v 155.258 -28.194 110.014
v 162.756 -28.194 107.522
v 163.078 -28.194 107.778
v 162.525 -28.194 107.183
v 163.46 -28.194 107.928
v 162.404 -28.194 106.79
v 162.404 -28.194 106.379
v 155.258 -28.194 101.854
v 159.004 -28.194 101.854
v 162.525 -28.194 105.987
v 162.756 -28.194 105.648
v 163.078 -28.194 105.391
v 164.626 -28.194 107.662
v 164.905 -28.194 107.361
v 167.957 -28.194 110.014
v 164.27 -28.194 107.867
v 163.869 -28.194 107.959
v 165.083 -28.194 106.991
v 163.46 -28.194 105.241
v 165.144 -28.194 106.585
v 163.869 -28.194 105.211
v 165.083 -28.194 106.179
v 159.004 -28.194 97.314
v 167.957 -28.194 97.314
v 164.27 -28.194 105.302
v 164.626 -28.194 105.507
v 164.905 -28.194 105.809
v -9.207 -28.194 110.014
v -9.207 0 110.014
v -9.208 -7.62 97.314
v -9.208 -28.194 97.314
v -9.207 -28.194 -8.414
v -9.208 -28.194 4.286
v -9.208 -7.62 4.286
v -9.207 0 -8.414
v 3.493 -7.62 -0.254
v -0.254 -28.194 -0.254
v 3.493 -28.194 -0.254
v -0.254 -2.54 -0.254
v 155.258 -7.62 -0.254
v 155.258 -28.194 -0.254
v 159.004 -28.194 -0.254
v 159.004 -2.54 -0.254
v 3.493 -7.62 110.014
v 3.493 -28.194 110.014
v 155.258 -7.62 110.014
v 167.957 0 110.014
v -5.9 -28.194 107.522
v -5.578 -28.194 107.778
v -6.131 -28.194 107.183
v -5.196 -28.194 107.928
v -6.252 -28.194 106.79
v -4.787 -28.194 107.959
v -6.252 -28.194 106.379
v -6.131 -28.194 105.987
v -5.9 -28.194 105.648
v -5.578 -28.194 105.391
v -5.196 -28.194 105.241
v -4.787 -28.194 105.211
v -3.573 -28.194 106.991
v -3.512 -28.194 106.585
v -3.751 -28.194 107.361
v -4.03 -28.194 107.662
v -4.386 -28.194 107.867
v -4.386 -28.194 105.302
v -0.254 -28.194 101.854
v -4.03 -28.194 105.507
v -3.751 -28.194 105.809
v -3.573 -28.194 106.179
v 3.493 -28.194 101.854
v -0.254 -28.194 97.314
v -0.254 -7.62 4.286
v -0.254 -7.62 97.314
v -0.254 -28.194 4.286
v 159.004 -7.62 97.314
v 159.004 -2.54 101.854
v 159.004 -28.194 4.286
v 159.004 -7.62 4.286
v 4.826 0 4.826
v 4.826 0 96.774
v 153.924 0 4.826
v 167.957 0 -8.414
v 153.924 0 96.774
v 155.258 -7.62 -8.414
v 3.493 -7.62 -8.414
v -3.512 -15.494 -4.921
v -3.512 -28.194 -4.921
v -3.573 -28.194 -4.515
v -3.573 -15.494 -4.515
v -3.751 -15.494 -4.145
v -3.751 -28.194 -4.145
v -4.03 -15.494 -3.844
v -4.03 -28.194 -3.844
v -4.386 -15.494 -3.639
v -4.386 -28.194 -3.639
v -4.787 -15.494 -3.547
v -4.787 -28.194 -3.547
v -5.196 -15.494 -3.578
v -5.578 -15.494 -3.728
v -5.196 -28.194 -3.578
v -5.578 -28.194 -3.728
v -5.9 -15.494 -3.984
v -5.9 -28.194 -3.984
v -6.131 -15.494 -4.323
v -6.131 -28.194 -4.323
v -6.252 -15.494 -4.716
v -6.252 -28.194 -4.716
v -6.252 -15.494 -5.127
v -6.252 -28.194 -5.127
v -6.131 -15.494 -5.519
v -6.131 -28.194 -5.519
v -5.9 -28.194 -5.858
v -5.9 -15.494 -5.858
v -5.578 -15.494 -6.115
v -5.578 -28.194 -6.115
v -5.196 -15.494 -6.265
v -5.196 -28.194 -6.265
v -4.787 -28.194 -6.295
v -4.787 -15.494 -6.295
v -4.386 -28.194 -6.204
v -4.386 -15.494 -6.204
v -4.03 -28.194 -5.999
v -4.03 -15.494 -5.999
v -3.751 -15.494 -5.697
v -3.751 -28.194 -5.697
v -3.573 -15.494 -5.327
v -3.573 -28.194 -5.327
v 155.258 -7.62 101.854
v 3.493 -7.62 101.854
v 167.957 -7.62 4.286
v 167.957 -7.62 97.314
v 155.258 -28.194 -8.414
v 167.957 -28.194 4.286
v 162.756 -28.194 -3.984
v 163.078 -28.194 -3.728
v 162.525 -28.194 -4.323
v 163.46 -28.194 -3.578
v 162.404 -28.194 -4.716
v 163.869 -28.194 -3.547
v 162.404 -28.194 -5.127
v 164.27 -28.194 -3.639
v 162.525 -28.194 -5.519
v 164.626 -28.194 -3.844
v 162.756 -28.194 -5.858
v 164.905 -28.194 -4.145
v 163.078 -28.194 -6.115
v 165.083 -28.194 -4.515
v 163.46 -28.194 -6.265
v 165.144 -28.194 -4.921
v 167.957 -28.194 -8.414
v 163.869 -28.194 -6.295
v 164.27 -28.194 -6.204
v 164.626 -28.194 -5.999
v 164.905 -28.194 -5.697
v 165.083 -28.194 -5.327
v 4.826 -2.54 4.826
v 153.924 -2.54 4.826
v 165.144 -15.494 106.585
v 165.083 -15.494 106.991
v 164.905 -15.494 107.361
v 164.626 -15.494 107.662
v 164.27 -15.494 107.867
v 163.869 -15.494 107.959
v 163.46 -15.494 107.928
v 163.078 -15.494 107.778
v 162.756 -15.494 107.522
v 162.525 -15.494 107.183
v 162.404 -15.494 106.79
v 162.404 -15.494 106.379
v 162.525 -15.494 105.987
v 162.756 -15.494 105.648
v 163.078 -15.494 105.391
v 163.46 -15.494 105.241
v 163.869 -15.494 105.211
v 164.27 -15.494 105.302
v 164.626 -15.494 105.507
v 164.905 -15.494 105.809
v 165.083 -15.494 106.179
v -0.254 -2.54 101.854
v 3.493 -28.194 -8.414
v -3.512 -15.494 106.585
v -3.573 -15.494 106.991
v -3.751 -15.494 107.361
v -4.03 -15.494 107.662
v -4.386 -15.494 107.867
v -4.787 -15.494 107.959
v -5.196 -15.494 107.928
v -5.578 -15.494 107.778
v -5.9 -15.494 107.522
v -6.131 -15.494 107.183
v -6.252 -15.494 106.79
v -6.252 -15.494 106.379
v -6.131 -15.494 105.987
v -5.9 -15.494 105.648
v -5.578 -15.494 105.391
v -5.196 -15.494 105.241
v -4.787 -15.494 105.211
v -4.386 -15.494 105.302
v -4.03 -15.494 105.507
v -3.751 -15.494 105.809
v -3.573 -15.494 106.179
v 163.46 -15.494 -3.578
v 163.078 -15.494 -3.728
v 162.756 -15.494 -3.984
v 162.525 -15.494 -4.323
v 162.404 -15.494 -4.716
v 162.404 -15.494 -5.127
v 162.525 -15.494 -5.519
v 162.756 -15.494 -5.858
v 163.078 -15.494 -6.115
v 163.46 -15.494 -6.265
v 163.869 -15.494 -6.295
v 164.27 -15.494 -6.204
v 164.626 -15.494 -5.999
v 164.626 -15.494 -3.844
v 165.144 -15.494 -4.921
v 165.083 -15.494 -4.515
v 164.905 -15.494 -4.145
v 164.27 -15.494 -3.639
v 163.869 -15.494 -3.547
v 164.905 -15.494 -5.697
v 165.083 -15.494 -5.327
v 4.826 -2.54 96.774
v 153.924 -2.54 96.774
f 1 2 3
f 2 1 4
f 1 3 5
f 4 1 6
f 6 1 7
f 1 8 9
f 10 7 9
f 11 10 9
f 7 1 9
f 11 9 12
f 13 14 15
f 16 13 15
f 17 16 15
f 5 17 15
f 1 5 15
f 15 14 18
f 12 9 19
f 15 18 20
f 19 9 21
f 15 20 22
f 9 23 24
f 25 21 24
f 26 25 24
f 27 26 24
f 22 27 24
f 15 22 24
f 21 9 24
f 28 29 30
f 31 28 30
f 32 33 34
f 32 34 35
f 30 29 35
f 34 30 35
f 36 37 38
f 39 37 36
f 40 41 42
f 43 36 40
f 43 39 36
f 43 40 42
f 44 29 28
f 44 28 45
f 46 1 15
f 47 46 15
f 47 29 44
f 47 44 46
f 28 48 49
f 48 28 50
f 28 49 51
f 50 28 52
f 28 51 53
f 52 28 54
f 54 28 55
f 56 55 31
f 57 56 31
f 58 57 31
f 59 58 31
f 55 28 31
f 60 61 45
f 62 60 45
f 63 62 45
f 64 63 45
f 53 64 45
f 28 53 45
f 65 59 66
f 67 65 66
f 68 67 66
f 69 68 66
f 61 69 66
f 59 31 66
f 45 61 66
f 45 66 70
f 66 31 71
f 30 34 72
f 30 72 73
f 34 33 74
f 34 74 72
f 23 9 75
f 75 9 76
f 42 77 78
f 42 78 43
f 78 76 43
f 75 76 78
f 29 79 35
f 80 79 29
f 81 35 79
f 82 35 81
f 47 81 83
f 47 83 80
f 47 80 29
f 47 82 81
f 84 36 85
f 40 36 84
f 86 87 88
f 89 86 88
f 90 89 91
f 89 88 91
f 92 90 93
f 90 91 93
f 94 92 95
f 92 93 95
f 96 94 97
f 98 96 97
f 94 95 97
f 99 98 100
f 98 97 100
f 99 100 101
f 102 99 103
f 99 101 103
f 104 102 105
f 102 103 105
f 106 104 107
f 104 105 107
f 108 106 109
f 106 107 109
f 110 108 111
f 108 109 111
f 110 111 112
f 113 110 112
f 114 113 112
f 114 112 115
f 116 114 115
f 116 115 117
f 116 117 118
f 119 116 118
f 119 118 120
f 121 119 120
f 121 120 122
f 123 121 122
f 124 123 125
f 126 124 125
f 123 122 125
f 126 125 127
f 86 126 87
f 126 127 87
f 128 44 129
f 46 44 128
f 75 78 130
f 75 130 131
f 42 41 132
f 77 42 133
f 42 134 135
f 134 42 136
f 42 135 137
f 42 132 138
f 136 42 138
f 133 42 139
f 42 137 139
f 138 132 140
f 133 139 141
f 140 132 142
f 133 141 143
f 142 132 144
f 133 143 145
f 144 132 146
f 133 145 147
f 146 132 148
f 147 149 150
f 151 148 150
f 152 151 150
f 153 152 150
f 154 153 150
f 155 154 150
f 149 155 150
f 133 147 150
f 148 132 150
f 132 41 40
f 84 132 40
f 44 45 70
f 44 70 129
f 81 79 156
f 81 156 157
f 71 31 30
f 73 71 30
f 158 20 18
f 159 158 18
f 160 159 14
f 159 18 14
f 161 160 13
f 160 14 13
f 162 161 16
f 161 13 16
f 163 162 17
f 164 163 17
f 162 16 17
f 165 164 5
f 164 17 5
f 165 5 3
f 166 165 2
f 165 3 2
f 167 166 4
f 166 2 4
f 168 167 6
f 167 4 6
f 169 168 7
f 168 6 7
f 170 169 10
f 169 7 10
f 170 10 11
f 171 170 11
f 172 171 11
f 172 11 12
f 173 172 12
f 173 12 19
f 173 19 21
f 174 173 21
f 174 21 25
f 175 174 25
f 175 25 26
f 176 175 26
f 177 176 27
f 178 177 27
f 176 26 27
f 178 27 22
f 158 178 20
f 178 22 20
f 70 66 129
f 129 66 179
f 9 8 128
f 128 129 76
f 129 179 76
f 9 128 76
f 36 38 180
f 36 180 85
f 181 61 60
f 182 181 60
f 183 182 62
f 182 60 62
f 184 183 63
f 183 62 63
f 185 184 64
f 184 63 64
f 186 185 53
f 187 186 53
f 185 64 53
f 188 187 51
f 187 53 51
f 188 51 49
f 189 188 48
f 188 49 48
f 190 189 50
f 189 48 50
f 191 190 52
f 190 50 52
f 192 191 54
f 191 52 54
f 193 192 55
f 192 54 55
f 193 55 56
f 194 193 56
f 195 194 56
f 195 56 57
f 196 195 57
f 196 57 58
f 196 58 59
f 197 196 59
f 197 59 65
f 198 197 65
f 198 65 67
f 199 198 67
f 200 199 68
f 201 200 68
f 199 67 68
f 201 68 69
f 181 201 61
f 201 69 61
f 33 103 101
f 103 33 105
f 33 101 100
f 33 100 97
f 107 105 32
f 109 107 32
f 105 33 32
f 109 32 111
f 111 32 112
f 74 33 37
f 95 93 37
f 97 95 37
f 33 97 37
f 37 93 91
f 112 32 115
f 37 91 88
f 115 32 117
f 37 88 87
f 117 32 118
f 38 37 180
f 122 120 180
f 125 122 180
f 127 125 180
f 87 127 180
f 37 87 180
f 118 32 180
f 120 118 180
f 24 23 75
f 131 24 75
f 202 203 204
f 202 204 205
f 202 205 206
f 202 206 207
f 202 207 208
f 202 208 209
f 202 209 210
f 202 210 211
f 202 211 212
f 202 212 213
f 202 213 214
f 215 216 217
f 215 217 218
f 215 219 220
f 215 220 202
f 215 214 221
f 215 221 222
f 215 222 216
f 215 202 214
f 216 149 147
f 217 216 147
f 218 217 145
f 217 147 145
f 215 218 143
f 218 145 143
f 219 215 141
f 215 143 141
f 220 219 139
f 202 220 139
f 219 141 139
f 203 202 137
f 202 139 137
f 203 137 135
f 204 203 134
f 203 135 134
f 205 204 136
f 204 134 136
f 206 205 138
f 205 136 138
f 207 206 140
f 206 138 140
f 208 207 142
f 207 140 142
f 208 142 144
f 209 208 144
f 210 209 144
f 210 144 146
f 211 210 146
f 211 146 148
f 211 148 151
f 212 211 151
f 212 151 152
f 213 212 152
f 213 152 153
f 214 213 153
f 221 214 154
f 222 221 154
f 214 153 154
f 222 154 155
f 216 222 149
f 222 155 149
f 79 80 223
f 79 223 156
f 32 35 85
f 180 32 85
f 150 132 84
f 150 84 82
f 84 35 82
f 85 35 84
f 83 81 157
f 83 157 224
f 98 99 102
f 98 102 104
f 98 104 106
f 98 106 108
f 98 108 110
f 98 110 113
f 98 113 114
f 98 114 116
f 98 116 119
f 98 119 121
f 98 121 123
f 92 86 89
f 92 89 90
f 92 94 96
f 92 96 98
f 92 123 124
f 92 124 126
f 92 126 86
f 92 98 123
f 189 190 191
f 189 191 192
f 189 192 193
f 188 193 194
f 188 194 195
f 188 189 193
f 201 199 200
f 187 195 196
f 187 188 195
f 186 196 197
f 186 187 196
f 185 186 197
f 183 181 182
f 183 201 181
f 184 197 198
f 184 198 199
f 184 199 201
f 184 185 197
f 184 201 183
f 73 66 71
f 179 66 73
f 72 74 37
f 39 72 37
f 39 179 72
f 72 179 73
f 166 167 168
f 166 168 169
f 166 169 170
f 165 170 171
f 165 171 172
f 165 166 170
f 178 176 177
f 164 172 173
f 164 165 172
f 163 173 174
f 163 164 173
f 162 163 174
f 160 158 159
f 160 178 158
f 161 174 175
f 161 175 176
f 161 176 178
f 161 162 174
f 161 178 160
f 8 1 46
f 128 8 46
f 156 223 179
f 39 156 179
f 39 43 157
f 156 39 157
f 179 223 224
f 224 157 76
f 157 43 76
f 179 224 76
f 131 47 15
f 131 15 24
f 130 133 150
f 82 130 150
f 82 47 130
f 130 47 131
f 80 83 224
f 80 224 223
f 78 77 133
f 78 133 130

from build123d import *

# Parameters (mm, degrees)
SKETCH1_W           = 177.165
SKETCH1_H           = 118.4275
SKETCH1_W_2         = 159.258
SKETCH1_H_2         = 102.108
BOSS_EXTRUDE1_DEPTH = 28.194
SKETCH2_W           = 159.258
SKETCH2_H           = 2.54
BOSS_EXTRUDE2_DEPTH = 5.08
SKETCH3_W           = 97.028
SKETCH3_H           = 2.54
BOSS_EXTRUDE3_DEPTH = 5.08
SKETCH4_W           = 154.178
SKETCH4_H           = 2.54
BOSS_EXTRUDE4_DEPTH = 5.08
SKETCH5_W           = 91.948
SKETCH5_H           = 2.54
BOSS_EXTRUDE5_DEPTH = 5.08
SKETCH10_W          = 93.0275
SKETCH10_H          = 20.574
CUT_EXTRUDE4_DEPTH  = 198.628
SKETCH9_W           = 151.765
SKETCH9_H           = 20.574
CUT_EXTRUDE5_DEPTH  = 198.628
SKETCH11_R          = 1.37795
CUT_EXTRUDE6_DEPTH  = 12.7


with BuildPart() as part:
    # Sketch1 → Boss-Extrude1 (new body)
    with BuildSketch(Plane(origin=(0, 0, 0), x_dir=(1, 0, 0), z_dir=(0, 1, 0))):
        with Locations((79.375, -50.8)):
            Rectangle(SKETCH1_W, SKETCH1_H)
        with Locations((79.375, -50.8)):
            Rectangle(SKETCH1_W_2, SKETCH1_H_2, mode=Mode.SUBTRACT)
    extrude(amount=-BOSS_EXTRUDE1_DEPTH)

    # Sketch2 → Boss-Extrude2 (add)
    with BuildSketch(Plane.XY.offset(-0.254)):
        with Locations((79.375, -1.27)):
            Rectangle(SKETCH2_W, SKETCH2_H)
    extrude(amount=BOSS_EXTRUDE2_DEPTH)

    # Sketch3 → Boss-Extrude3 (add)
    with BuildSketch(Plane(origin=(-0.254, 0, 0), x_dir=(0, 0, -1), z_dir=(1, 0, 0))):
        with Locations((-53.34, -1.27)):
            Rectangle(SKETCH3_W, SKETCH3_H)
    extrude(amount=BOSS_EXTRUDE3_DEPTH)

    # Sketch4 → Boss-Extrude4 (add)
    with BuildSketch(Plane(origin=(0, 0, 101.854), x_dir=(-1, 0, 0), z_dir=(0, 0, -1))):
        with Locations((-81.915, -1.27)):
            Rectangle(SKETCH4_W, SKETCH4_H)
    extrude(amount=BOSS_EXTRUDE4_DEPTH)

    # Sketch5 → Boss-Extrude5 (add)
    with BuildSketch(Plane.ZY.offset(-159.004)):
        with Locations((50.8, -1.27)):
            Rectangle(SKETCH5_W, SKETCH5_H)
    extrude(amount=BOSS_EXTRUDE5_DEPTH)

    # Sketch10 → Cut-Extrude4 (cut)
    with BuildSketch(Plane.ZY.offset(9.2075)):
        with Locations((50.8, -17.907)):
            Rectangle(SKETCH10_W, SKETCH10_H)
    extrude(amount=-CUT_EXTRUDE4_DEPTH, mode=Mode.SUBTRACT)

    # Sketch9 → Cut-Extrude5 (cut)
    with BuildSketch(Plane.XY.offset(110.01375)):
        with Locations((79.375, -17.907)):
            Rectangle(SKETCH9_W, SKETCH9_H)
    extrude(amount=-CUT_EXTRUDE5_DEPTH, mode=Mode.SUBTRACT)

    # Sketch11 → Cut-Extrude6 (cut)
    with BuildSketch(Plane.XZ.offset(28.194)):
        with Locations((-4.8895, 106.58475)):
            Circle(SKETCH11_R)
        with Locations((-4.8895, -4.92125)):
            Circle(SKETCH11_R)
        with Locations((163.7665, -4.92125)):
            Circle(SKETCH11_R)
        with Locations((163.7665, 106.58475)):
            Circle(SKETCH11_R)
    extrude(amount=-CUT_EXTRUDE6_DEPTH, mode=Mode.SUBTRACT)


solid = part.part
